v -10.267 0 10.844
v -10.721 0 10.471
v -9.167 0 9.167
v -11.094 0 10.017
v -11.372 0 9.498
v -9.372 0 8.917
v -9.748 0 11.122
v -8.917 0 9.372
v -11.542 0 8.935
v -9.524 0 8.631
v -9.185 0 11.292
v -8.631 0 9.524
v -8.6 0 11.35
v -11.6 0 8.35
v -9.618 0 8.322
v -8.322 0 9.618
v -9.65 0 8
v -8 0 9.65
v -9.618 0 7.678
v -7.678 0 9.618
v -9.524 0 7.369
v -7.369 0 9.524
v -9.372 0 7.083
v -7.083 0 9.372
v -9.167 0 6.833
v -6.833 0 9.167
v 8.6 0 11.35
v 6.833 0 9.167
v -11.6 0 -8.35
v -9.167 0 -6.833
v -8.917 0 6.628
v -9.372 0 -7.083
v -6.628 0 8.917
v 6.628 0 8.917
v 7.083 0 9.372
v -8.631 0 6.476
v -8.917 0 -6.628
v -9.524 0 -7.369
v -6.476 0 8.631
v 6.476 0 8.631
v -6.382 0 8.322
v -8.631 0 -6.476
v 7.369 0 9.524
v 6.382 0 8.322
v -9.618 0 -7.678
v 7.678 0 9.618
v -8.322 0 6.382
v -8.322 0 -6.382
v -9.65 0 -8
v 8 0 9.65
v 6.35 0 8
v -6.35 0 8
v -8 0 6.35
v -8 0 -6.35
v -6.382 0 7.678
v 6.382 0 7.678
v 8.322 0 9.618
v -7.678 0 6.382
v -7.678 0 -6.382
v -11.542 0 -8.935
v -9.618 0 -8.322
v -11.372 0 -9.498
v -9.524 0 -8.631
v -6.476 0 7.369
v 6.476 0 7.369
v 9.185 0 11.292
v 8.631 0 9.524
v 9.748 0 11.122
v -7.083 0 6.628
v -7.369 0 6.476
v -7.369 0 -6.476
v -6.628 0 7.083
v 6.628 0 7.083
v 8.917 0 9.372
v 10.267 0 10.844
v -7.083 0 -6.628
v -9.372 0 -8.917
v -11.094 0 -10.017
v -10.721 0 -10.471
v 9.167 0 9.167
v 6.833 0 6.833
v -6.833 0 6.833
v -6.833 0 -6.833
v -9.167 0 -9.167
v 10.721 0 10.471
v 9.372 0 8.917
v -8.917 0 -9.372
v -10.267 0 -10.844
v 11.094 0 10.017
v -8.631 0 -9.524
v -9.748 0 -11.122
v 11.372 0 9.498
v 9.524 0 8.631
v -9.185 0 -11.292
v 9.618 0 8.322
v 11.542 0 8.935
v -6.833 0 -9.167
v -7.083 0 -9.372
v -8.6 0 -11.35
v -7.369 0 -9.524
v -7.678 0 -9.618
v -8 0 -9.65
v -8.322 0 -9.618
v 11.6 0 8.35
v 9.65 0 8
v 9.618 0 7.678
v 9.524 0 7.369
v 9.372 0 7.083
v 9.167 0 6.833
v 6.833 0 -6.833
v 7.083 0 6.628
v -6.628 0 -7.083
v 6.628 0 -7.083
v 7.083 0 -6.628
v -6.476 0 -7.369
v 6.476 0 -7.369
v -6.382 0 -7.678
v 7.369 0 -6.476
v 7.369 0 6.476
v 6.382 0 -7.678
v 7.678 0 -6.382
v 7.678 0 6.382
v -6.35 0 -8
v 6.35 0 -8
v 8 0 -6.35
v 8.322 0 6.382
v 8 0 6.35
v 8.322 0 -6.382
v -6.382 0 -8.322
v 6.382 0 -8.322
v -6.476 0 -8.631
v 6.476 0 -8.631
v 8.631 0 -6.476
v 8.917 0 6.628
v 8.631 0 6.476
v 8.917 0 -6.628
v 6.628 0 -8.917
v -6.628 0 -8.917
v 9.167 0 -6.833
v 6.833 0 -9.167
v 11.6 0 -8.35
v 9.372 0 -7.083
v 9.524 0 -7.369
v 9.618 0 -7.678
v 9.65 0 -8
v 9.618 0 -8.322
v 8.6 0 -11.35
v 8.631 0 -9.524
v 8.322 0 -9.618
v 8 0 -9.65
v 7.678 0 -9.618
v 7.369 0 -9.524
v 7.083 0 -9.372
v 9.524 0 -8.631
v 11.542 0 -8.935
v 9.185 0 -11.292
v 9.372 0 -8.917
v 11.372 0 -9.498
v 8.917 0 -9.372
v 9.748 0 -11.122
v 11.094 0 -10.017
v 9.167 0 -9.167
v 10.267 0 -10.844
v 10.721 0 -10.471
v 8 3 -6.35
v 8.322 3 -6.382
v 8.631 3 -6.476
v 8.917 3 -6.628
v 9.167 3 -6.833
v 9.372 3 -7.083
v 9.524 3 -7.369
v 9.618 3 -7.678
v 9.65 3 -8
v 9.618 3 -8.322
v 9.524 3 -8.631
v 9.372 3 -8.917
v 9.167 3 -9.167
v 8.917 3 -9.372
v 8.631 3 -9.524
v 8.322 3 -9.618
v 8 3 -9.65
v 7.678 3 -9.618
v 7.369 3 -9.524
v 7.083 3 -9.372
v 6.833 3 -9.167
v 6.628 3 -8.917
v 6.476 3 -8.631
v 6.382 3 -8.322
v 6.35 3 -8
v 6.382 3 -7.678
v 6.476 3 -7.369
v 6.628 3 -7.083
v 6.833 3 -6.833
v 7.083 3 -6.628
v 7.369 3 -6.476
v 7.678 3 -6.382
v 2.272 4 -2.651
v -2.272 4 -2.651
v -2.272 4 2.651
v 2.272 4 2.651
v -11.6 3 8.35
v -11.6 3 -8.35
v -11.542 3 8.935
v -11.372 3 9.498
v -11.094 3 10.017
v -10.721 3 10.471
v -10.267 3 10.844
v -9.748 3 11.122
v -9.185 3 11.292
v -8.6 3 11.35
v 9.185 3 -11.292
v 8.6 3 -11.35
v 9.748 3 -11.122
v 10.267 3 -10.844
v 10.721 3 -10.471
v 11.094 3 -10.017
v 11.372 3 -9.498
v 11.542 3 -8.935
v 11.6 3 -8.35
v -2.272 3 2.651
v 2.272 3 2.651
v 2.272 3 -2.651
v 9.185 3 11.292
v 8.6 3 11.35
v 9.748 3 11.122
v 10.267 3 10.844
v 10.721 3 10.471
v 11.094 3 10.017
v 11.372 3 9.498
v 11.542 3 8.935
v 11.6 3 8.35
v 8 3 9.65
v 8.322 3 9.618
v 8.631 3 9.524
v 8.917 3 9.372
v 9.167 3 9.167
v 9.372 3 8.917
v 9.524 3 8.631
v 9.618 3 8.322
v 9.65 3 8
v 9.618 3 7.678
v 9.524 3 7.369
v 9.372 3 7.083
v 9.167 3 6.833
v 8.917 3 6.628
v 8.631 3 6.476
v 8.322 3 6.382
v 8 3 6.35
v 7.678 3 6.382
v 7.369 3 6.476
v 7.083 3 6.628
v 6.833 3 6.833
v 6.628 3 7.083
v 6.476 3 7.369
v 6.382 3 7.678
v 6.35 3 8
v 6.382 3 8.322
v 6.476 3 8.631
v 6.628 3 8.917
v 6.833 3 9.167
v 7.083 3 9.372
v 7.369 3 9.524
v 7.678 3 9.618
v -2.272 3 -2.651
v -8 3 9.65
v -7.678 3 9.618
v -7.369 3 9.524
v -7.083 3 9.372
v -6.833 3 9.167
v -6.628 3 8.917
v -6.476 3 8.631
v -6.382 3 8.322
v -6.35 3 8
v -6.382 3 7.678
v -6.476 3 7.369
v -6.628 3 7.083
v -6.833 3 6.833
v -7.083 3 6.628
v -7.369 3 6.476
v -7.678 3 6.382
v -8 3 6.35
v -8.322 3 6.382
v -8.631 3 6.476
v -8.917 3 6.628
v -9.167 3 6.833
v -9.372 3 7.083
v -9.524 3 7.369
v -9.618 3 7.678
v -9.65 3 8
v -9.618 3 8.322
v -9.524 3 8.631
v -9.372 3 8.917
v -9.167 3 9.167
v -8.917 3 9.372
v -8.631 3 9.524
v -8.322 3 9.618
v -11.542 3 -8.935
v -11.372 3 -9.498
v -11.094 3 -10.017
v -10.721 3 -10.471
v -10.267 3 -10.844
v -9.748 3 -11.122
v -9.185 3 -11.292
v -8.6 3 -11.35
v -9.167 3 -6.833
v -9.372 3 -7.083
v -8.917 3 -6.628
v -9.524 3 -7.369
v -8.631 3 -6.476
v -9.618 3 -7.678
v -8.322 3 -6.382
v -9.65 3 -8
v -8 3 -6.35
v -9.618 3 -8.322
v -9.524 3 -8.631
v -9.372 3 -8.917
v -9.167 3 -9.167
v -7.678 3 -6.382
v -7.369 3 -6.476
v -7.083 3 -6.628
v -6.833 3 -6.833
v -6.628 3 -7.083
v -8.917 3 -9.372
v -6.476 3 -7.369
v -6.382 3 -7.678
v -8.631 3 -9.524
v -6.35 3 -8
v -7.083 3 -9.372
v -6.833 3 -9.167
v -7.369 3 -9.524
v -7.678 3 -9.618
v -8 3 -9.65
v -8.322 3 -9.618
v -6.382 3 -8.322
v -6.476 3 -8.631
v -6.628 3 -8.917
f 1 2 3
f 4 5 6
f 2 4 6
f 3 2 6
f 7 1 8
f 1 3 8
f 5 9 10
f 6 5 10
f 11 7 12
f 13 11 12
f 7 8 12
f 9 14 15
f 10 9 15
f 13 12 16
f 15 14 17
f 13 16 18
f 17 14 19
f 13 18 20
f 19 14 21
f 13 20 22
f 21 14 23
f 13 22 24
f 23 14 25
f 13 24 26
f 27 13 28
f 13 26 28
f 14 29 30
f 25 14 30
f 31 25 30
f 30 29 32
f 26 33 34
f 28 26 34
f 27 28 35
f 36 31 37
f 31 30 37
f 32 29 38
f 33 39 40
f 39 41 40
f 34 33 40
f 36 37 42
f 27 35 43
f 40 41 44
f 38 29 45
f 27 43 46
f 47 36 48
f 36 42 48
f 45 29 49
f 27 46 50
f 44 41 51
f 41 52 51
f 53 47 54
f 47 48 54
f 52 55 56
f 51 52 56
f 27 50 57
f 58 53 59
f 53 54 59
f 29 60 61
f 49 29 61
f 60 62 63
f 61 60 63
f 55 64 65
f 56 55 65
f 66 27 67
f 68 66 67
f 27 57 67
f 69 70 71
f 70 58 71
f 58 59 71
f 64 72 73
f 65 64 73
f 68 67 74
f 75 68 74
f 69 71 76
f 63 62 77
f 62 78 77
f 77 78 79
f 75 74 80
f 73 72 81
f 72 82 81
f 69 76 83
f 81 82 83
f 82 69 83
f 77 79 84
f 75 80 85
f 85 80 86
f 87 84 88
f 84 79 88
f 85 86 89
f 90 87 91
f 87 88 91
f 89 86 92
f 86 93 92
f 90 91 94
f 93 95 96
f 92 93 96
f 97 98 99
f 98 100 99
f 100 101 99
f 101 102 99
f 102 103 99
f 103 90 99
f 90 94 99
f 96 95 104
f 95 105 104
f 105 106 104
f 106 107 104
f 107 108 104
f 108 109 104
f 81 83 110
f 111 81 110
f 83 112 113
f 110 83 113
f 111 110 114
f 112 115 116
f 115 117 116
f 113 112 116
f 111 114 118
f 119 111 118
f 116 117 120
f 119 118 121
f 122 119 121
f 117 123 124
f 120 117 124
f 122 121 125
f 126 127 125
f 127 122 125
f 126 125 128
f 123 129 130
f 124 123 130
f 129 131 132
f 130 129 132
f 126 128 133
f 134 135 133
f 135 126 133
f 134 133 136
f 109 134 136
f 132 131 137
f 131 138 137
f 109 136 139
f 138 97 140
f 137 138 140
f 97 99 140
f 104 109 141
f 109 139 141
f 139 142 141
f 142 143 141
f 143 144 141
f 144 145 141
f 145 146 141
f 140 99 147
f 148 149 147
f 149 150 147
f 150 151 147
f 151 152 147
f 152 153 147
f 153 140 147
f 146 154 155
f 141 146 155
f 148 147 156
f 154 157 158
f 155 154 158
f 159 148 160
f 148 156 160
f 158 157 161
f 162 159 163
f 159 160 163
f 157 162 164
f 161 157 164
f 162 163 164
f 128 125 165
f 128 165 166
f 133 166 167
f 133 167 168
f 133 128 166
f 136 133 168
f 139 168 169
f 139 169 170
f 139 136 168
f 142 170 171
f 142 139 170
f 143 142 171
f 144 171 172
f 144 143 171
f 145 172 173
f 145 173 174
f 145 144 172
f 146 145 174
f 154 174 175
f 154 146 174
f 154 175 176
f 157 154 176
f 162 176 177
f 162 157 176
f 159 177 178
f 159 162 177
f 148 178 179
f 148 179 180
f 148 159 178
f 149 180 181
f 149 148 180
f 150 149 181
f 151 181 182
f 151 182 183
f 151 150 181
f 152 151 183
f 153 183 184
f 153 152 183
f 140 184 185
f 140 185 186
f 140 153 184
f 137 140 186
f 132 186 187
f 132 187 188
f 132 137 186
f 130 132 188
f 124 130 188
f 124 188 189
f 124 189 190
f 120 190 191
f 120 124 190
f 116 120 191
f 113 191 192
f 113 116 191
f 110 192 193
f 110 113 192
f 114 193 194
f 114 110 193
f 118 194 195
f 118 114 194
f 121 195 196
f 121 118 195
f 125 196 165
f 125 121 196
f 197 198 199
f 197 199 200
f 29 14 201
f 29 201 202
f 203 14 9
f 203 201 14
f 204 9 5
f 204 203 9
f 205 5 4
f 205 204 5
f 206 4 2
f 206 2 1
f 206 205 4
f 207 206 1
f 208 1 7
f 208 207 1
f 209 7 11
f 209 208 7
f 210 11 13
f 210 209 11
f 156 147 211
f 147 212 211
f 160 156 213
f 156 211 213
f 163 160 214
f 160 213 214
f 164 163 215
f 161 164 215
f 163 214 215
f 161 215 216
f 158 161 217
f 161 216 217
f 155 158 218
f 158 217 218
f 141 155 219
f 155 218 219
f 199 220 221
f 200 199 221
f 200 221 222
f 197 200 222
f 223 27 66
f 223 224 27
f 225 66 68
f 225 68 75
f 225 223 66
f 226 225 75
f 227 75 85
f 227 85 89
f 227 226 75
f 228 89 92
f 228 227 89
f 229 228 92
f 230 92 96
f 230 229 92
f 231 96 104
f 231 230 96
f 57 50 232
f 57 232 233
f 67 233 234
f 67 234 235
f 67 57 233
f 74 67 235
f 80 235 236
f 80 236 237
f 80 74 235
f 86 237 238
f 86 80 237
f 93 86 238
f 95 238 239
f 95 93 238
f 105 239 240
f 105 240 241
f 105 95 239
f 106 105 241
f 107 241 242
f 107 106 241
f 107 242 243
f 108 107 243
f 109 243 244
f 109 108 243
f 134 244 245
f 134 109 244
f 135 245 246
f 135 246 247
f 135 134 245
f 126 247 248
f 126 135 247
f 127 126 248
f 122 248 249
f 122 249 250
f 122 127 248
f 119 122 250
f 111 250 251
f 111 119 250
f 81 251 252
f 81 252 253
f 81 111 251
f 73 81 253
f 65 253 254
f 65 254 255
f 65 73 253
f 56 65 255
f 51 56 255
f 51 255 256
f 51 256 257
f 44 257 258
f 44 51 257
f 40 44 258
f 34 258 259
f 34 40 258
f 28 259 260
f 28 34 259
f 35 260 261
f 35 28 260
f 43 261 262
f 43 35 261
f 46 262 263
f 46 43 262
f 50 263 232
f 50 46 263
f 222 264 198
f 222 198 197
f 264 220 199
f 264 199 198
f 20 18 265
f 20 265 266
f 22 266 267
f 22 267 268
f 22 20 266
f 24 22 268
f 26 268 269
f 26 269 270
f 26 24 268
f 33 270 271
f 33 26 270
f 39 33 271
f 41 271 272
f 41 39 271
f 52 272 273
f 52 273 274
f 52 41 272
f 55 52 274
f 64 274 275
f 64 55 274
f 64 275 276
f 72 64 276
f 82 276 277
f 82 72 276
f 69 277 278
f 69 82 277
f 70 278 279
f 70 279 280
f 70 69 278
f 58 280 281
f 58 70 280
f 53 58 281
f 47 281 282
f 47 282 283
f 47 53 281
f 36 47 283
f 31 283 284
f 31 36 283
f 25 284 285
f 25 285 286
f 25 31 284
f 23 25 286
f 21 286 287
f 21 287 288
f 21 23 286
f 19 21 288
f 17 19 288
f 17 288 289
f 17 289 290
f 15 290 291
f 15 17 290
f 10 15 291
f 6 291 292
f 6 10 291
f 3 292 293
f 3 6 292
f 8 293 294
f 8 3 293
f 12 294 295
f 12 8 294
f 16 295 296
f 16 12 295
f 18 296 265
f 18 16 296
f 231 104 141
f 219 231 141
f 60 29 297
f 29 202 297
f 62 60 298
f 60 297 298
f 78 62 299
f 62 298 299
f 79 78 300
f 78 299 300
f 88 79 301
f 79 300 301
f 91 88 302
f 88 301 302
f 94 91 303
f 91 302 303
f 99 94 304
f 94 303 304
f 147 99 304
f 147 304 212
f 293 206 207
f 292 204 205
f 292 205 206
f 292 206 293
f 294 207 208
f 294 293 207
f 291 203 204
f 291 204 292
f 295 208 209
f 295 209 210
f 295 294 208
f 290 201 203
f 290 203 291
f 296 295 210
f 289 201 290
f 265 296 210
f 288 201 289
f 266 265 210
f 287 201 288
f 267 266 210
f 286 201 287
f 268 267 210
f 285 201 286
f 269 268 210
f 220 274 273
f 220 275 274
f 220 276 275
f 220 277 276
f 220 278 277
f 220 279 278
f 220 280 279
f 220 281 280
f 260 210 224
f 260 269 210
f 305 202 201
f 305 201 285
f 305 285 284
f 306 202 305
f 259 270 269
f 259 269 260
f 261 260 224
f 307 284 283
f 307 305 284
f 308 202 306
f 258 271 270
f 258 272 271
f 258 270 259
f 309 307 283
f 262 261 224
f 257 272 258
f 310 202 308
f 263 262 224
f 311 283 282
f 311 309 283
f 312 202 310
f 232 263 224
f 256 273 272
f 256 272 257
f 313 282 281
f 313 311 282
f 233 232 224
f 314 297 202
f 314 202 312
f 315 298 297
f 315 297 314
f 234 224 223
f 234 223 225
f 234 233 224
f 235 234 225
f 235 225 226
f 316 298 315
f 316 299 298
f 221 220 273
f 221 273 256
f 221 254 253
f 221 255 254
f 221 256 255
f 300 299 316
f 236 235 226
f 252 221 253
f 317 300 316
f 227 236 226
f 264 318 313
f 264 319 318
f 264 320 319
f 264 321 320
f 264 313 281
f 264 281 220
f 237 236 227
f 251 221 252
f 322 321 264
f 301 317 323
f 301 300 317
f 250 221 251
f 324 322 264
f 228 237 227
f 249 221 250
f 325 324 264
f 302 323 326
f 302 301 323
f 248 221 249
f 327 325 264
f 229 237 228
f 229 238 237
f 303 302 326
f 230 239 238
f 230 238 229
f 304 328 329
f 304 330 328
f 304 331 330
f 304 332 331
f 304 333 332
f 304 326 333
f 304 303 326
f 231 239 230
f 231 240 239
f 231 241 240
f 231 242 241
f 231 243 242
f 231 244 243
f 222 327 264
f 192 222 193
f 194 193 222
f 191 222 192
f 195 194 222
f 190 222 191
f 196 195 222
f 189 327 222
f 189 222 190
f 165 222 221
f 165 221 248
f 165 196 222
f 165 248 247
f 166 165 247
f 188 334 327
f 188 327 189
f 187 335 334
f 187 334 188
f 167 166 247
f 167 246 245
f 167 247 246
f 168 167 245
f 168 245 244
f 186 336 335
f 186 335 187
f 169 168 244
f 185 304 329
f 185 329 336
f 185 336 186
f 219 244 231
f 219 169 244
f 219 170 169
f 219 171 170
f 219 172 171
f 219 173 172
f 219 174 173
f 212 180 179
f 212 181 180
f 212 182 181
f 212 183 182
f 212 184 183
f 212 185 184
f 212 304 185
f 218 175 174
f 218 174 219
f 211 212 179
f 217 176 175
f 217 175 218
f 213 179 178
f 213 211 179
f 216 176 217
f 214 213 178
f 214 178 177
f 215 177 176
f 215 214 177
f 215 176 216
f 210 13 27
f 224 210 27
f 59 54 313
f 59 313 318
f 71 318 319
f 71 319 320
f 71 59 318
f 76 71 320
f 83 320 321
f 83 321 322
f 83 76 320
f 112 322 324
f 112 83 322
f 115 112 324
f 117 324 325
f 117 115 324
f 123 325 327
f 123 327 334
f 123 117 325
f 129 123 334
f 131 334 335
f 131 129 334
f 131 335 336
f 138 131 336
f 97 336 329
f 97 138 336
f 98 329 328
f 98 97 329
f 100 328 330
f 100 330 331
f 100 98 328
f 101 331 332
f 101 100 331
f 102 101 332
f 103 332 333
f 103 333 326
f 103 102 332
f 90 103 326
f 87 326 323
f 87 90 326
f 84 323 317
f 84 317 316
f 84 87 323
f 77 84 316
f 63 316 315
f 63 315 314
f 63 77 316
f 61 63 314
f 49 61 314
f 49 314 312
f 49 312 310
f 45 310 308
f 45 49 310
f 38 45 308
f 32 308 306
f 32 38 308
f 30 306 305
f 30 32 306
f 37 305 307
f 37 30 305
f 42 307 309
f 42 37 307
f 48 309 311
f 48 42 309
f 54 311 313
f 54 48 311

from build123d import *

# Parameters (mm, degrees)
SKETCH_1_W      = 23.2
SKETCH_1_H      = 22.7
SKETCH_1_R      = 1.65
EXTRUDE_1_DEPTH = 3
FILLET_1_R      = 3
SKETCH_2_W      = 4.543947028
SKETCH_2_H      = 5.301271532
EXTRUDE_2_DEPTH = 1


with BuildPart() as part:
    # 草图1 → 凸台-拉伸1 (new body)
    with BuildSketch(Plane(origin=(0, 0, 0), x_dir=(1, 0, 0), z_dir=(0, 1, 0))):
        Rectangle(SKETCH_1_W, SKETCH_1_H)
        with Locations(Location((-8, 8, 0), (0, 0, 270))):
            Circle(SKETCH_1_R, mode=Mode.SUBTRACT)
        with Locations(Location((8, 8, 0), (0, 0, 270))):
            Circle(SKETCH_1_R, mode=Mode.SUBTRACT)
        with Locations(Location((8, -8, 0), (0, 0, 270))):
            Circle(SKETCH_1_R, mode=Mode.SUBTRACT)
        with Locations(Location((-8, -8, 0), (0, 0, 270))):
            Circle(SKETCH_1_R, mode=Mode.SUBTRACT)
    extrude(amount=EXTRUDE_1_DEPTH)

    # 圆角1
    fillet_1_edges = [part.edges().sort_by_distance(p)[0] for p in [
        (11.6, 1.5, 11.35),
        (-11.6, 1.5, 11.35),
        (-11.6, 1.5, -11.35),
        (11.6, 1.5, -11.35),
    ]]
    fillet(fillet_1_edges, radius=FILLET_1_R)

    # 草图2 → 凸台-拉伸2 (add)
    with BuildSketch(Plane(origin=(0, 3, 0), x_dir=(1, 0, 0), z_dir=(0, 1, 0))):
        Rectangle(SKETCH_2_W, SKETCH_2_H)
    extrude(amount=EXTRUDE_2_DEPTH)


solid = part.part
